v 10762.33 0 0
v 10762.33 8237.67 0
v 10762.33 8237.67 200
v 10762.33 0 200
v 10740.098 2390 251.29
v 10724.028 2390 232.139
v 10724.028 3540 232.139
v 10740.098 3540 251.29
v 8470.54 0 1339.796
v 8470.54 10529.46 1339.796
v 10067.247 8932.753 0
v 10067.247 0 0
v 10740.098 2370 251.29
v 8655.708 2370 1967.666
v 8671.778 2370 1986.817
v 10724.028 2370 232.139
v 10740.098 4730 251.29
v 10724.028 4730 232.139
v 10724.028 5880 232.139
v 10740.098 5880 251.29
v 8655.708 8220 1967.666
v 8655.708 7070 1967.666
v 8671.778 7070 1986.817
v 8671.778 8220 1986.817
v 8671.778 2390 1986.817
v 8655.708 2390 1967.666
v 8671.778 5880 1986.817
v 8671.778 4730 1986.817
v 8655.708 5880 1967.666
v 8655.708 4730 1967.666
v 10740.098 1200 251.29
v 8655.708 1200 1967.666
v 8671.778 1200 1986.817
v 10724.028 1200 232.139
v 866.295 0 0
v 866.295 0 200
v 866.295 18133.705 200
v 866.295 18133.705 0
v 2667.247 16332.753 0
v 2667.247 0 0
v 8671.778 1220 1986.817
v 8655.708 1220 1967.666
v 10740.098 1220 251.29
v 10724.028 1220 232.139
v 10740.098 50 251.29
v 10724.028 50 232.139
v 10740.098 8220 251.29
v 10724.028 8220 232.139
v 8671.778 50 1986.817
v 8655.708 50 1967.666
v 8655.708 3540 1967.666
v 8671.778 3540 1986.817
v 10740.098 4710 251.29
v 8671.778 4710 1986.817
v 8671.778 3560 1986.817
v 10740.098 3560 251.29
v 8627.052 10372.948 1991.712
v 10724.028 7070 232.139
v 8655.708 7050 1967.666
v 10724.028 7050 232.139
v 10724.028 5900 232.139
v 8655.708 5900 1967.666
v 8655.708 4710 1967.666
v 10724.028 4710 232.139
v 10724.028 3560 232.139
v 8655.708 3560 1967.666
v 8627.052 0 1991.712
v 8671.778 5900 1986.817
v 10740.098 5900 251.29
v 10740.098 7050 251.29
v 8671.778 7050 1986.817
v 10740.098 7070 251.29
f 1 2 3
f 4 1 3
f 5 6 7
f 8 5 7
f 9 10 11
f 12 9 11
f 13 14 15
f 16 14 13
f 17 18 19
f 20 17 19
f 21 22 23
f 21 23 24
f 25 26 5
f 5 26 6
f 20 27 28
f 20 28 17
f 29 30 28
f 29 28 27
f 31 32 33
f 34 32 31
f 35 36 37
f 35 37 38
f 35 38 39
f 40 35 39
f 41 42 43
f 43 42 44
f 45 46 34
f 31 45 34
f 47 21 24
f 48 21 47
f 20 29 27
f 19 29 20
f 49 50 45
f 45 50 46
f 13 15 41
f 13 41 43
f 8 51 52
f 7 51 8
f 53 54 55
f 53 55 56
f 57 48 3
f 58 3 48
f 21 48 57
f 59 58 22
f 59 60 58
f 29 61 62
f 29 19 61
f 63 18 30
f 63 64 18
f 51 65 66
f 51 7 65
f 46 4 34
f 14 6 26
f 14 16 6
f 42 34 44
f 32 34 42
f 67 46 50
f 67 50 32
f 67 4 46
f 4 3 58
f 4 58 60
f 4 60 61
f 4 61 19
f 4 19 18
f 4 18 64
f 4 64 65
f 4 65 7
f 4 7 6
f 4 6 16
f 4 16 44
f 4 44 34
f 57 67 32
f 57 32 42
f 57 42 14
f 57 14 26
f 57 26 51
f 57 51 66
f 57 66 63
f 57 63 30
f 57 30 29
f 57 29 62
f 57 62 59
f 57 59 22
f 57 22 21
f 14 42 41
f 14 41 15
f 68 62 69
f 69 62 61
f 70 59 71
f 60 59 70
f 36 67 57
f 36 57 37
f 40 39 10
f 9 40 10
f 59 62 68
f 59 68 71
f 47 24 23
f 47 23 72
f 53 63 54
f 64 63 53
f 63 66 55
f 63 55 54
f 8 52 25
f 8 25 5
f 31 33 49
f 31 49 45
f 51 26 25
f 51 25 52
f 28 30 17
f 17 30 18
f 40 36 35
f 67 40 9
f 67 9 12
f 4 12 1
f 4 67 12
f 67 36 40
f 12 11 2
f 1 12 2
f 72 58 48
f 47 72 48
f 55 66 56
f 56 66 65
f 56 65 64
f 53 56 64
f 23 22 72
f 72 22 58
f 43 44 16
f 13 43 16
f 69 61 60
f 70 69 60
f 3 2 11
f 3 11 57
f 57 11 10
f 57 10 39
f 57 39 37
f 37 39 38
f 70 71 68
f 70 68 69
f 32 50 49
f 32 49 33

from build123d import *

# Parameters (mm, degrees)
F1_DEPTH = 19000
F3_DEPTH = 1991.7127787042
F4_W     = 2700
F4_H     = 1150
F5_DEPTH = 25


# Not quite as in the source:
# - a feature names something its author has since deleted; it is built from what else it names


with BuildPart() as f1:
    # F0 (on Front) → F1 (new body)
    with BuildSketch(Plane.XZ):
        Polygon((8627.0515179848, 1991.7117787042), (866.2951748568, 200), (866.2951748568, 0), (2667.2468895515, 0), (8470.5403543473, 1339.7958647882), (10067.2468895515, 0), (10762.3304671489, 0), (10762.3304671489, 200), align=None)
    extrude(amount=-F1_DEPTH)

    # F2 (on face) → F3 (cut, through all)
    with BuildSketch(Plane(origin=(0, 0, 0), x_dir=(1, 0, 0), z_dir=(0, 0, -1))):
        Polygon((2667.2468895515, -16332.7531104485), (2667.2468895515, -19000), (11151.2481142848, -19000), (11151.2481142848, -7848.7518857152), align=None)
        Polygon((866.2951748568, -18133.7048251432), (866.2951748568, -19000), (2667.2468895515, -19000), (2667.2468895515, -16332.7531104485), align=None)
    extrude(amount=-F3_DEPTH, mode=Mode.SUBTRACT)

    # F4 (on face) → F5 (join)
    with BuildSketch(Plane(origin=(4545.2164723408, 0, 5416.7780600306), x_dir=(0.7660444431, 0, -0.6427876097), z_dir=(0.6427876097, 0, 0.7660444431))):
        with Locations((6715.8659274322, 625)):
            Rectangle(F4_W, F4_H)
        with Locations((6715.8659274322, 1795)):
            Rectangle(F4_W, F4_H)
        with Locations((6715.8659274322, 2965)):
            Rectangle(F4_W, F4_H)
        with Locations((6715.8659274322, 4135)):
            Rectangle(F4_W, F4_H)
        with Locations((6715.8659274322, 5305)):
            Rectangle(F4_W, F4_H)
        with Locations((6715.8659274322, 6475)):
            Rectangle(F4_W, F4_H)
        with Locations((6715.8659274322, 7645)):
            Rectangle(F4_W, F4_H)
    extrude(amount=F5_DEPTH)


solid = f1.part
